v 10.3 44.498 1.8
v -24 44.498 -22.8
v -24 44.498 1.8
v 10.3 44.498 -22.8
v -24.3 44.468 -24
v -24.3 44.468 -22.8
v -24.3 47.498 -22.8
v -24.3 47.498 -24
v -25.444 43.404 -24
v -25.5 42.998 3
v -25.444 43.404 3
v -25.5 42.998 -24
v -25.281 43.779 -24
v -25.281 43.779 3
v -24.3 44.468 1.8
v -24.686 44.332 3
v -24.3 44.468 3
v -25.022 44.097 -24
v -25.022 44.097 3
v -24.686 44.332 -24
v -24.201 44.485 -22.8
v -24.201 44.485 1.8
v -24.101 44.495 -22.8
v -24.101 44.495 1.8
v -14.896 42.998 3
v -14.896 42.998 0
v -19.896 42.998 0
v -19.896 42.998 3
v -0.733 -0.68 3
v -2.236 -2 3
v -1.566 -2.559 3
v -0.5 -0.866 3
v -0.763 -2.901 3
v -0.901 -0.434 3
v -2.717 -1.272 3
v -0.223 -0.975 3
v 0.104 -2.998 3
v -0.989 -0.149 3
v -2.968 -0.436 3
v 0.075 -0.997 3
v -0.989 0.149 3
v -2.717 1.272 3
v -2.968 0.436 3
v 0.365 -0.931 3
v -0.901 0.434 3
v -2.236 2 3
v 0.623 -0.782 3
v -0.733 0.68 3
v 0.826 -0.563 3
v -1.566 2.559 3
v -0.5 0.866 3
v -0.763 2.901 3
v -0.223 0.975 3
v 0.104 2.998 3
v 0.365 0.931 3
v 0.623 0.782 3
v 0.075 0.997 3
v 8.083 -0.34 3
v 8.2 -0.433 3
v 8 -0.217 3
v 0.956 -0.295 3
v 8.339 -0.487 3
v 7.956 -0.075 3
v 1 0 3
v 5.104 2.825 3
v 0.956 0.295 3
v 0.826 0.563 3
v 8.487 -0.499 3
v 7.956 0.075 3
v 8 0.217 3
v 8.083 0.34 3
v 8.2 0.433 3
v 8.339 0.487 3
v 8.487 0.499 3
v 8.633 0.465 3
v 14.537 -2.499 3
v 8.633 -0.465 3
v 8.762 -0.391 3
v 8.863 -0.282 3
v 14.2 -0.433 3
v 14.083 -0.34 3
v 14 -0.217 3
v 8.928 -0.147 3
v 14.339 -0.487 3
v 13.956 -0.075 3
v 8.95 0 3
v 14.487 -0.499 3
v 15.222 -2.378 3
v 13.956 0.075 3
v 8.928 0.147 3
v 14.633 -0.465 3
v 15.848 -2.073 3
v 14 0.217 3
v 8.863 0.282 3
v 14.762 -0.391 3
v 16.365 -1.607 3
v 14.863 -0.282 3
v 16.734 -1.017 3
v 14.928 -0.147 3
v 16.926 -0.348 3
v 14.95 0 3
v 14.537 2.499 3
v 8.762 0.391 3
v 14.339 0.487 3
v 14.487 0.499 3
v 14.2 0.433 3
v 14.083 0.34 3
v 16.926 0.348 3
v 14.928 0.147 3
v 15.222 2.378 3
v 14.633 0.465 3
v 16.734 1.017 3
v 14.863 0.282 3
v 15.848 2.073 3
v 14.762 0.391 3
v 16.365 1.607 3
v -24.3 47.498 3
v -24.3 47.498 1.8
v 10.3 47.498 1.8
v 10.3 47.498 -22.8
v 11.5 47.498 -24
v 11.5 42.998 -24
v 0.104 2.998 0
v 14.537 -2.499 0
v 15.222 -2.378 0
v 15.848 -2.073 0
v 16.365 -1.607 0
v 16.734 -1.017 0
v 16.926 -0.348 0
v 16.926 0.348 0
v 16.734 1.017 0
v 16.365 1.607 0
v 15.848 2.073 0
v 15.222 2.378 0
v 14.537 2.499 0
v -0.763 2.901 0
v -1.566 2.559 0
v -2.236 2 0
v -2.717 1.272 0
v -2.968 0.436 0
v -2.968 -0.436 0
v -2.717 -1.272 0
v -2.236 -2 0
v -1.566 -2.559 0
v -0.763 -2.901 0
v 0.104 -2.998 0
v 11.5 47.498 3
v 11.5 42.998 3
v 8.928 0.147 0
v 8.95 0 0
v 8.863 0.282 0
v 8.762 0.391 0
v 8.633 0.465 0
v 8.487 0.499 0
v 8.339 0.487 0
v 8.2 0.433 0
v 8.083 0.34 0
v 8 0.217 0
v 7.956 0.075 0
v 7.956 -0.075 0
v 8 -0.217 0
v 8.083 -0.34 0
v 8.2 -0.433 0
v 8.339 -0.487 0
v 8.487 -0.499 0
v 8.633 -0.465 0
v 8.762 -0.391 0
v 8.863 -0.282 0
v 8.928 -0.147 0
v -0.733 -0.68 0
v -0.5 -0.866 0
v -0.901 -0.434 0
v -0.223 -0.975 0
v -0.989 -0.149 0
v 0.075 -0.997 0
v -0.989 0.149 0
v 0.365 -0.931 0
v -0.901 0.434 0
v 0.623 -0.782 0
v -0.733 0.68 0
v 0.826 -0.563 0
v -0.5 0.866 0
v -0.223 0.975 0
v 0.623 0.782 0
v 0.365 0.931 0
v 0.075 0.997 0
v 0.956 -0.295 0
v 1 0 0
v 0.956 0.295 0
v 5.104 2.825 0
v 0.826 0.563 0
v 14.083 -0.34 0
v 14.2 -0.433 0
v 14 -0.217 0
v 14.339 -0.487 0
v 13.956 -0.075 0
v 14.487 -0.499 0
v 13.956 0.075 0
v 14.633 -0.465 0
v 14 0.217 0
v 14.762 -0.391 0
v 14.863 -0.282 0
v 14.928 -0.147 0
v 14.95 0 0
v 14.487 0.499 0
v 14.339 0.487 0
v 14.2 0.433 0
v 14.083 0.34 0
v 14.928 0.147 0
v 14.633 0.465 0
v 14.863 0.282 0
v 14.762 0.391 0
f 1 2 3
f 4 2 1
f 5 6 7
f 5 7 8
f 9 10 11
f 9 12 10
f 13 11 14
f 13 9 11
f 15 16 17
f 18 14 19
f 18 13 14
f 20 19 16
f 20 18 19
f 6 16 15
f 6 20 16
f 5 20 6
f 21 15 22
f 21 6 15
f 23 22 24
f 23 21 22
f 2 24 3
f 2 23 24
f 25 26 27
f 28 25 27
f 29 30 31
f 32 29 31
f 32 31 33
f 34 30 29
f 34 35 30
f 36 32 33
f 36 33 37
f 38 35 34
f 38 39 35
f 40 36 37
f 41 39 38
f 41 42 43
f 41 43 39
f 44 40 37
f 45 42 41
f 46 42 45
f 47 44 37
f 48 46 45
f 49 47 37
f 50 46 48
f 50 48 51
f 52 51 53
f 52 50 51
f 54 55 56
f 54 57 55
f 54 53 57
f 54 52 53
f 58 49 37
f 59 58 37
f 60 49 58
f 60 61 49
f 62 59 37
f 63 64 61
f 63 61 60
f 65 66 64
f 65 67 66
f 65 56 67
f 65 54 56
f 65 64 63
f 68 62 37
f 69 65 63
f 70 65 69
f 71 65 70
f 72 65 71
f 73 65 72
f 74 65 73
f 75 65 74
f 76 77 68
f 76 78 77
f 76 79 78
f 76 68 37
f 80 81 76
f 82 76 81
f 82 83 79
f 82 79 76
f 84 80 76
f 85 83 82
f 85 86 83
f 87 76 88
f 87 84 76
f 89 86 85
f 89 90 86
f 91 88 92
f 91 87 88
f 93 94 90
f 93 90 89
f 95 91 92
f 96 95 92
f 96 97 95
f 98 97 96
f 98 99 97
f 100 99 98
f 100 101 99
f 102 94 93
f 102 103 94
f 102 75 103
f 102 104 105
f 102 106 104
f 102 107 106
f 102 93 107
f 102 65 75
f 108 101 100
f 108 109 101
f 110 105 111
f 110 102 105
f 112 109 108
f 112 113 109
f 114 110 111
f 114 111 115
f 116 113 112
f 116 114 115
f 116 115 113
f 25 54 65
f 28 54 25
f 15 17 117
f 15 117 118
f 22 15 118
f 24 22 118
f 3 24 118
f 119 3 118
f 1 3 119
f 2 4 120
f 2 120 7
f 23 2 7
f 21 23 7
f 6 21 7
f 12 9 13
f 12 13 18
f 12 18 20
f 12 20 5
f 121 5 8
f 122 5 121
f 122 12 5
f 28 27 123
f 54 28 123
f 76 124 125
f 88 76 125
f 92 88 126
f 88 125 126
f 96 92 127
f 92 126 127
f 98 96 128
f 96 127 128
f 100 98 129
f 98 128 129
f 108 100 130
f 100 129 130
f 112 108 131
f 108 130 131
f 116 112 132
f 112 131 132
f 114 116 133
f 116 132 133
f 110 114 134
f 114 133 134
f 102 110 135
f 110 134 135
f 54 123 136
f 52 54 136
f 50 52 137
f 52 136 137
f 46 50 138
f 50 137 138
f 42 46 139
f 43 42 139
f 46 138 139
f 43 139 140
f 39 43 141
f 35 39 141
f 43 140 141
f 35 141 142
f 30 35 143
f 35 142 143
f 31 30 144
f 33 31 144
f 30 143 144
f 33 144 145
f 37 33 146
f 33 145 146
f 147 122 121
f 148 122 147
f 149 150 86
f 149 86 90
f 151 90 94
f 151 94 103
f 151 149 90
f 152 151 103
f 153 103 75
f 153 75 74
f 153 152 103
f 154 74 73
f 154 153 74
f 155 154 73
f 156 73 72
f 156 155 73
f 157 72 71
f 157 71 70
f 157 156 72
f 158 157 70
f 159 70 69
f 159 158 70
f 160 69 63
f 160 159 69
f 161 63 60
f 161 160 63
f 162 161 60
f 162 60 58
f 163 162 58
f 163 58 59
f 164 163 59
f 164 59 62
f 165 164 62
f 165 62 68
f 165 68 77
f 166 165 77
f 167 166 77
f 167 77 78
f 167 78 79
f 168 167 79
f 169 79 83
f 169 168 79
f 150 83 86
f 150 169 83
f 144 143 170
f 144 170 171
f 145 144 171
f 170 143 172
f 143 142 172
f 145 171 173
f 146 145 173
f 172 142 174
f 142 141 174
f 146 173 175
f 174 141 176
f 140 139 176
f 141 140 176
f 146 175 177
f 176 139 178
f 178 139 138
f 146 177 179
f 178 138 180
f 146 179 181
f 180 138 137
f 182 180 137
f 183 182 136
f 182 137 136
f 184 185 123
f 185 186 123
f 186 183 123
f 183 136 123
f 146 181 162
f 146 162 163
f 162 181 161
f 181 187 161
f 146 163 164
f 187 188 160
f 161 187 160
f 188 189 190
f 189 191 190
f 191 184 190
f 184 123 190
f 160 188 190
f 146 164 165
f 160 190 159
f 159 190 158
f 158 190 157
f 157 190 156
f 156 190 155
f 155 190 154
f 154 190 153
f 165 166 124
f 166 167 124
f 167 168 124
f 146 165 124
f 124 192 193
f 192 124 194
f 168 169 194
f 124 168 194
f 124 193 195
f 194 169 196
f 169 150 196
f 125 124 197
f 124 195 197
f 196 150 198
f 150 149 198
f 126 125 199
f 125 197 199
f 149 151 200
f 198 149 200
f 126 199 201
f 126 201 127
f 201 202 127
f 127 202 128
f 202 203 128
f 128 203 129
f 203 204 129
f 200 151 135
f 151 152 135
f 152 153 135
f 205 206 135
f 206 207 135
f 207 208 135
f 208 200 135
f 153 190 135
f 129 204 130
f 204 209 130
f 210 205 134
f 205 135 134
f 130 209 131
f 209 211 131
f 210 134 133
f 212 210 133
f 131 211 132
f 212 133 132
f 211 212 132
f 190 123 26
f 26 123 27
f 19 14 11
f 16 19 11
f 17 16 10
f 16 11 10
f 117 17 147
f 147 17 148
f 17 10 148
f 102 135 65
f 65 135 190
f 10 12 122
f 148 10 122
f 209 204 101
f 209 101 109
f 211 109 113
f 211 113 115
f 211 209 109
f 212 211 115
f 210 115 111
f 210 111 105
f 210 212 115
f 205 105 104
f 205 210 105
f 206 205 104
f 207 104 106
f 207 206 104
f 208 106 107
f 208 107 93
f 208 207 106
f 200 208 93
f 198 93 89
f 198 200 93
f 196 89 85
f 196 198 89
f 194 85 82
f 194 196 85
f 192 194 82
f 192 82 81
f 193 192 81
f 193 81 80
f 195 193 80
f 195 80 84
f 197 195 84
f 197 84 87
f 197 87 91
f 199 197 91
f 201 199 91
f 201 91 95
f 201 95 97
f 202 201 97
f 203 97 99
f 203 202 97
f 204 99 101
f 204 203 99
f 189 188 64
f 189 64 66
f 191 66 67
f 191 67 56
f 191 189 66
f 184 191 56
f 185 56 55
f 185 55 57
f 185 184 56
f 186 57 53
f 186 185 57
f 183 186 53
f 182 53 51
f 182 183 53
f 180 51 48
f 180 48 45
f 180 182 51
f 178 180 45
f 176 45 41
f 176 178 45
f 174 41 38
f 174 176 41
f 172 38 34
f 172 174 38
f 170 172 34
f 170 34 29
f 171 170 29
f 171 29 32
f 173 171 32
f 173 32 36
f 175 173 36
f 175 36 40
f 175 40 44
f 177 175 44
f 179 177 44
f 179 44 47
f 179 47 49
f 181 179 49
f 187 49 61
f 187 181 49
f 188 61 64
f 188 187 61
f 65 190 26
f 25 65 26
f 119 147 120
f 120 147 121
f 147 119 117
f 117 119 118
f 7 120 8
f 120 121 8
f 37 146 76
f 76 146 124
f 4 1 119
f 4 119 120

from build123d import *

# Parameters (mm, degrees)
SKETCH1_R           = 1
SKETCH1_R_2         = 0.5
BOSS_EXTRUDE1_DEPTH = 3
SKETCH4_W           = 37
SKETCH4_H           = 27
BOSS_EXTRUDE3_DEPTH = 1.5
BOSS_EXTRUDE4_DEPTH = 3
FILLET1_R           = 1.5


with BuildPart() as part:
    # Sketch1 → Boss-Extrude1 (new body)
    with BuildSketch(Plane.XY):
        with BuildLine():
            Line((0.103806228, -2.998203507), (14.53650519, -2.498502922))
            ThreePointArc((14.53650519, -2.498502922), (16.95, 0), (14.53650519, 2.498502922))
            Line((14.53650519, 2.498502922), (5.103806228, 2.82508946))
            Line((5.103806228, 2.82508946), (-14.896193772, 42.998203507))
            Line((-14.896193772, 42.998203507), (-19.896193772, 42.998203507))
            Line((-19.896193772, 42.998203507), (0.103806228, 2.998203507))
            ThreePointArc((0.103806228, 2.998203507), (-3, 0), (0.103806228, -2.998203507))
        make_face()
        Circle(SKETCH1_R, mode=Mode.SUBTRACT)
        with Locations((8.45, 0)):
            Circle(SKETCH1_R_2, mode=Mode.SUBTRACT)
        with Locations((14.45, 0)):
            Circle(SKETCH1_R_2, mode=Mode.SUBTRACT)
    extrude(amount=BOSS_EXTRUDE1_DEPTH)


with BuildPart() as body_2:
    # Sketch4 → Boss-Extrude3 (new body)
    with BuildSketch(Plane(origin=(0, 42.998203507, 0), x_dir=(1, 0, 0), z_dir=(0, 1, 0))):
        with Locations((-7, 10.5)):
            Rectangle(SKETCH4_W, SKETCH4_H)
    extrude(amount=BOSS_EXTRUDE3_DEPTH)

    # Sketch5 → Boss-Extrude4 (add)
    with BuildSketch(Plane(origin=(0, 44.498203507, 0), x_dir=(1, 0, 0), z_dir=(0, 1, 0))):
        Polygon((-24.3, 22.8), (-24.3, 24), (11.5, 24), (11.5, -3), (-24.3, -3), (-24.3, -1.8), (10.3, -1.8), (10.3, 22.8), align=None)
    extrude(amount=BOSS_EXTRUDE4_DEPTH)

    # Fillet1
    fillet1_edges = [body_2.edges().sort_by_distance(p)[0] for p in [
        (-25.5, 44.498203507, -10.5),
    ]]
    fillet(fillet1_edges, radius=FILLET1_R - 0.0001)  # a hair under: the kernel refuses the full size


solid = Compound([part.part, body_2.part])
